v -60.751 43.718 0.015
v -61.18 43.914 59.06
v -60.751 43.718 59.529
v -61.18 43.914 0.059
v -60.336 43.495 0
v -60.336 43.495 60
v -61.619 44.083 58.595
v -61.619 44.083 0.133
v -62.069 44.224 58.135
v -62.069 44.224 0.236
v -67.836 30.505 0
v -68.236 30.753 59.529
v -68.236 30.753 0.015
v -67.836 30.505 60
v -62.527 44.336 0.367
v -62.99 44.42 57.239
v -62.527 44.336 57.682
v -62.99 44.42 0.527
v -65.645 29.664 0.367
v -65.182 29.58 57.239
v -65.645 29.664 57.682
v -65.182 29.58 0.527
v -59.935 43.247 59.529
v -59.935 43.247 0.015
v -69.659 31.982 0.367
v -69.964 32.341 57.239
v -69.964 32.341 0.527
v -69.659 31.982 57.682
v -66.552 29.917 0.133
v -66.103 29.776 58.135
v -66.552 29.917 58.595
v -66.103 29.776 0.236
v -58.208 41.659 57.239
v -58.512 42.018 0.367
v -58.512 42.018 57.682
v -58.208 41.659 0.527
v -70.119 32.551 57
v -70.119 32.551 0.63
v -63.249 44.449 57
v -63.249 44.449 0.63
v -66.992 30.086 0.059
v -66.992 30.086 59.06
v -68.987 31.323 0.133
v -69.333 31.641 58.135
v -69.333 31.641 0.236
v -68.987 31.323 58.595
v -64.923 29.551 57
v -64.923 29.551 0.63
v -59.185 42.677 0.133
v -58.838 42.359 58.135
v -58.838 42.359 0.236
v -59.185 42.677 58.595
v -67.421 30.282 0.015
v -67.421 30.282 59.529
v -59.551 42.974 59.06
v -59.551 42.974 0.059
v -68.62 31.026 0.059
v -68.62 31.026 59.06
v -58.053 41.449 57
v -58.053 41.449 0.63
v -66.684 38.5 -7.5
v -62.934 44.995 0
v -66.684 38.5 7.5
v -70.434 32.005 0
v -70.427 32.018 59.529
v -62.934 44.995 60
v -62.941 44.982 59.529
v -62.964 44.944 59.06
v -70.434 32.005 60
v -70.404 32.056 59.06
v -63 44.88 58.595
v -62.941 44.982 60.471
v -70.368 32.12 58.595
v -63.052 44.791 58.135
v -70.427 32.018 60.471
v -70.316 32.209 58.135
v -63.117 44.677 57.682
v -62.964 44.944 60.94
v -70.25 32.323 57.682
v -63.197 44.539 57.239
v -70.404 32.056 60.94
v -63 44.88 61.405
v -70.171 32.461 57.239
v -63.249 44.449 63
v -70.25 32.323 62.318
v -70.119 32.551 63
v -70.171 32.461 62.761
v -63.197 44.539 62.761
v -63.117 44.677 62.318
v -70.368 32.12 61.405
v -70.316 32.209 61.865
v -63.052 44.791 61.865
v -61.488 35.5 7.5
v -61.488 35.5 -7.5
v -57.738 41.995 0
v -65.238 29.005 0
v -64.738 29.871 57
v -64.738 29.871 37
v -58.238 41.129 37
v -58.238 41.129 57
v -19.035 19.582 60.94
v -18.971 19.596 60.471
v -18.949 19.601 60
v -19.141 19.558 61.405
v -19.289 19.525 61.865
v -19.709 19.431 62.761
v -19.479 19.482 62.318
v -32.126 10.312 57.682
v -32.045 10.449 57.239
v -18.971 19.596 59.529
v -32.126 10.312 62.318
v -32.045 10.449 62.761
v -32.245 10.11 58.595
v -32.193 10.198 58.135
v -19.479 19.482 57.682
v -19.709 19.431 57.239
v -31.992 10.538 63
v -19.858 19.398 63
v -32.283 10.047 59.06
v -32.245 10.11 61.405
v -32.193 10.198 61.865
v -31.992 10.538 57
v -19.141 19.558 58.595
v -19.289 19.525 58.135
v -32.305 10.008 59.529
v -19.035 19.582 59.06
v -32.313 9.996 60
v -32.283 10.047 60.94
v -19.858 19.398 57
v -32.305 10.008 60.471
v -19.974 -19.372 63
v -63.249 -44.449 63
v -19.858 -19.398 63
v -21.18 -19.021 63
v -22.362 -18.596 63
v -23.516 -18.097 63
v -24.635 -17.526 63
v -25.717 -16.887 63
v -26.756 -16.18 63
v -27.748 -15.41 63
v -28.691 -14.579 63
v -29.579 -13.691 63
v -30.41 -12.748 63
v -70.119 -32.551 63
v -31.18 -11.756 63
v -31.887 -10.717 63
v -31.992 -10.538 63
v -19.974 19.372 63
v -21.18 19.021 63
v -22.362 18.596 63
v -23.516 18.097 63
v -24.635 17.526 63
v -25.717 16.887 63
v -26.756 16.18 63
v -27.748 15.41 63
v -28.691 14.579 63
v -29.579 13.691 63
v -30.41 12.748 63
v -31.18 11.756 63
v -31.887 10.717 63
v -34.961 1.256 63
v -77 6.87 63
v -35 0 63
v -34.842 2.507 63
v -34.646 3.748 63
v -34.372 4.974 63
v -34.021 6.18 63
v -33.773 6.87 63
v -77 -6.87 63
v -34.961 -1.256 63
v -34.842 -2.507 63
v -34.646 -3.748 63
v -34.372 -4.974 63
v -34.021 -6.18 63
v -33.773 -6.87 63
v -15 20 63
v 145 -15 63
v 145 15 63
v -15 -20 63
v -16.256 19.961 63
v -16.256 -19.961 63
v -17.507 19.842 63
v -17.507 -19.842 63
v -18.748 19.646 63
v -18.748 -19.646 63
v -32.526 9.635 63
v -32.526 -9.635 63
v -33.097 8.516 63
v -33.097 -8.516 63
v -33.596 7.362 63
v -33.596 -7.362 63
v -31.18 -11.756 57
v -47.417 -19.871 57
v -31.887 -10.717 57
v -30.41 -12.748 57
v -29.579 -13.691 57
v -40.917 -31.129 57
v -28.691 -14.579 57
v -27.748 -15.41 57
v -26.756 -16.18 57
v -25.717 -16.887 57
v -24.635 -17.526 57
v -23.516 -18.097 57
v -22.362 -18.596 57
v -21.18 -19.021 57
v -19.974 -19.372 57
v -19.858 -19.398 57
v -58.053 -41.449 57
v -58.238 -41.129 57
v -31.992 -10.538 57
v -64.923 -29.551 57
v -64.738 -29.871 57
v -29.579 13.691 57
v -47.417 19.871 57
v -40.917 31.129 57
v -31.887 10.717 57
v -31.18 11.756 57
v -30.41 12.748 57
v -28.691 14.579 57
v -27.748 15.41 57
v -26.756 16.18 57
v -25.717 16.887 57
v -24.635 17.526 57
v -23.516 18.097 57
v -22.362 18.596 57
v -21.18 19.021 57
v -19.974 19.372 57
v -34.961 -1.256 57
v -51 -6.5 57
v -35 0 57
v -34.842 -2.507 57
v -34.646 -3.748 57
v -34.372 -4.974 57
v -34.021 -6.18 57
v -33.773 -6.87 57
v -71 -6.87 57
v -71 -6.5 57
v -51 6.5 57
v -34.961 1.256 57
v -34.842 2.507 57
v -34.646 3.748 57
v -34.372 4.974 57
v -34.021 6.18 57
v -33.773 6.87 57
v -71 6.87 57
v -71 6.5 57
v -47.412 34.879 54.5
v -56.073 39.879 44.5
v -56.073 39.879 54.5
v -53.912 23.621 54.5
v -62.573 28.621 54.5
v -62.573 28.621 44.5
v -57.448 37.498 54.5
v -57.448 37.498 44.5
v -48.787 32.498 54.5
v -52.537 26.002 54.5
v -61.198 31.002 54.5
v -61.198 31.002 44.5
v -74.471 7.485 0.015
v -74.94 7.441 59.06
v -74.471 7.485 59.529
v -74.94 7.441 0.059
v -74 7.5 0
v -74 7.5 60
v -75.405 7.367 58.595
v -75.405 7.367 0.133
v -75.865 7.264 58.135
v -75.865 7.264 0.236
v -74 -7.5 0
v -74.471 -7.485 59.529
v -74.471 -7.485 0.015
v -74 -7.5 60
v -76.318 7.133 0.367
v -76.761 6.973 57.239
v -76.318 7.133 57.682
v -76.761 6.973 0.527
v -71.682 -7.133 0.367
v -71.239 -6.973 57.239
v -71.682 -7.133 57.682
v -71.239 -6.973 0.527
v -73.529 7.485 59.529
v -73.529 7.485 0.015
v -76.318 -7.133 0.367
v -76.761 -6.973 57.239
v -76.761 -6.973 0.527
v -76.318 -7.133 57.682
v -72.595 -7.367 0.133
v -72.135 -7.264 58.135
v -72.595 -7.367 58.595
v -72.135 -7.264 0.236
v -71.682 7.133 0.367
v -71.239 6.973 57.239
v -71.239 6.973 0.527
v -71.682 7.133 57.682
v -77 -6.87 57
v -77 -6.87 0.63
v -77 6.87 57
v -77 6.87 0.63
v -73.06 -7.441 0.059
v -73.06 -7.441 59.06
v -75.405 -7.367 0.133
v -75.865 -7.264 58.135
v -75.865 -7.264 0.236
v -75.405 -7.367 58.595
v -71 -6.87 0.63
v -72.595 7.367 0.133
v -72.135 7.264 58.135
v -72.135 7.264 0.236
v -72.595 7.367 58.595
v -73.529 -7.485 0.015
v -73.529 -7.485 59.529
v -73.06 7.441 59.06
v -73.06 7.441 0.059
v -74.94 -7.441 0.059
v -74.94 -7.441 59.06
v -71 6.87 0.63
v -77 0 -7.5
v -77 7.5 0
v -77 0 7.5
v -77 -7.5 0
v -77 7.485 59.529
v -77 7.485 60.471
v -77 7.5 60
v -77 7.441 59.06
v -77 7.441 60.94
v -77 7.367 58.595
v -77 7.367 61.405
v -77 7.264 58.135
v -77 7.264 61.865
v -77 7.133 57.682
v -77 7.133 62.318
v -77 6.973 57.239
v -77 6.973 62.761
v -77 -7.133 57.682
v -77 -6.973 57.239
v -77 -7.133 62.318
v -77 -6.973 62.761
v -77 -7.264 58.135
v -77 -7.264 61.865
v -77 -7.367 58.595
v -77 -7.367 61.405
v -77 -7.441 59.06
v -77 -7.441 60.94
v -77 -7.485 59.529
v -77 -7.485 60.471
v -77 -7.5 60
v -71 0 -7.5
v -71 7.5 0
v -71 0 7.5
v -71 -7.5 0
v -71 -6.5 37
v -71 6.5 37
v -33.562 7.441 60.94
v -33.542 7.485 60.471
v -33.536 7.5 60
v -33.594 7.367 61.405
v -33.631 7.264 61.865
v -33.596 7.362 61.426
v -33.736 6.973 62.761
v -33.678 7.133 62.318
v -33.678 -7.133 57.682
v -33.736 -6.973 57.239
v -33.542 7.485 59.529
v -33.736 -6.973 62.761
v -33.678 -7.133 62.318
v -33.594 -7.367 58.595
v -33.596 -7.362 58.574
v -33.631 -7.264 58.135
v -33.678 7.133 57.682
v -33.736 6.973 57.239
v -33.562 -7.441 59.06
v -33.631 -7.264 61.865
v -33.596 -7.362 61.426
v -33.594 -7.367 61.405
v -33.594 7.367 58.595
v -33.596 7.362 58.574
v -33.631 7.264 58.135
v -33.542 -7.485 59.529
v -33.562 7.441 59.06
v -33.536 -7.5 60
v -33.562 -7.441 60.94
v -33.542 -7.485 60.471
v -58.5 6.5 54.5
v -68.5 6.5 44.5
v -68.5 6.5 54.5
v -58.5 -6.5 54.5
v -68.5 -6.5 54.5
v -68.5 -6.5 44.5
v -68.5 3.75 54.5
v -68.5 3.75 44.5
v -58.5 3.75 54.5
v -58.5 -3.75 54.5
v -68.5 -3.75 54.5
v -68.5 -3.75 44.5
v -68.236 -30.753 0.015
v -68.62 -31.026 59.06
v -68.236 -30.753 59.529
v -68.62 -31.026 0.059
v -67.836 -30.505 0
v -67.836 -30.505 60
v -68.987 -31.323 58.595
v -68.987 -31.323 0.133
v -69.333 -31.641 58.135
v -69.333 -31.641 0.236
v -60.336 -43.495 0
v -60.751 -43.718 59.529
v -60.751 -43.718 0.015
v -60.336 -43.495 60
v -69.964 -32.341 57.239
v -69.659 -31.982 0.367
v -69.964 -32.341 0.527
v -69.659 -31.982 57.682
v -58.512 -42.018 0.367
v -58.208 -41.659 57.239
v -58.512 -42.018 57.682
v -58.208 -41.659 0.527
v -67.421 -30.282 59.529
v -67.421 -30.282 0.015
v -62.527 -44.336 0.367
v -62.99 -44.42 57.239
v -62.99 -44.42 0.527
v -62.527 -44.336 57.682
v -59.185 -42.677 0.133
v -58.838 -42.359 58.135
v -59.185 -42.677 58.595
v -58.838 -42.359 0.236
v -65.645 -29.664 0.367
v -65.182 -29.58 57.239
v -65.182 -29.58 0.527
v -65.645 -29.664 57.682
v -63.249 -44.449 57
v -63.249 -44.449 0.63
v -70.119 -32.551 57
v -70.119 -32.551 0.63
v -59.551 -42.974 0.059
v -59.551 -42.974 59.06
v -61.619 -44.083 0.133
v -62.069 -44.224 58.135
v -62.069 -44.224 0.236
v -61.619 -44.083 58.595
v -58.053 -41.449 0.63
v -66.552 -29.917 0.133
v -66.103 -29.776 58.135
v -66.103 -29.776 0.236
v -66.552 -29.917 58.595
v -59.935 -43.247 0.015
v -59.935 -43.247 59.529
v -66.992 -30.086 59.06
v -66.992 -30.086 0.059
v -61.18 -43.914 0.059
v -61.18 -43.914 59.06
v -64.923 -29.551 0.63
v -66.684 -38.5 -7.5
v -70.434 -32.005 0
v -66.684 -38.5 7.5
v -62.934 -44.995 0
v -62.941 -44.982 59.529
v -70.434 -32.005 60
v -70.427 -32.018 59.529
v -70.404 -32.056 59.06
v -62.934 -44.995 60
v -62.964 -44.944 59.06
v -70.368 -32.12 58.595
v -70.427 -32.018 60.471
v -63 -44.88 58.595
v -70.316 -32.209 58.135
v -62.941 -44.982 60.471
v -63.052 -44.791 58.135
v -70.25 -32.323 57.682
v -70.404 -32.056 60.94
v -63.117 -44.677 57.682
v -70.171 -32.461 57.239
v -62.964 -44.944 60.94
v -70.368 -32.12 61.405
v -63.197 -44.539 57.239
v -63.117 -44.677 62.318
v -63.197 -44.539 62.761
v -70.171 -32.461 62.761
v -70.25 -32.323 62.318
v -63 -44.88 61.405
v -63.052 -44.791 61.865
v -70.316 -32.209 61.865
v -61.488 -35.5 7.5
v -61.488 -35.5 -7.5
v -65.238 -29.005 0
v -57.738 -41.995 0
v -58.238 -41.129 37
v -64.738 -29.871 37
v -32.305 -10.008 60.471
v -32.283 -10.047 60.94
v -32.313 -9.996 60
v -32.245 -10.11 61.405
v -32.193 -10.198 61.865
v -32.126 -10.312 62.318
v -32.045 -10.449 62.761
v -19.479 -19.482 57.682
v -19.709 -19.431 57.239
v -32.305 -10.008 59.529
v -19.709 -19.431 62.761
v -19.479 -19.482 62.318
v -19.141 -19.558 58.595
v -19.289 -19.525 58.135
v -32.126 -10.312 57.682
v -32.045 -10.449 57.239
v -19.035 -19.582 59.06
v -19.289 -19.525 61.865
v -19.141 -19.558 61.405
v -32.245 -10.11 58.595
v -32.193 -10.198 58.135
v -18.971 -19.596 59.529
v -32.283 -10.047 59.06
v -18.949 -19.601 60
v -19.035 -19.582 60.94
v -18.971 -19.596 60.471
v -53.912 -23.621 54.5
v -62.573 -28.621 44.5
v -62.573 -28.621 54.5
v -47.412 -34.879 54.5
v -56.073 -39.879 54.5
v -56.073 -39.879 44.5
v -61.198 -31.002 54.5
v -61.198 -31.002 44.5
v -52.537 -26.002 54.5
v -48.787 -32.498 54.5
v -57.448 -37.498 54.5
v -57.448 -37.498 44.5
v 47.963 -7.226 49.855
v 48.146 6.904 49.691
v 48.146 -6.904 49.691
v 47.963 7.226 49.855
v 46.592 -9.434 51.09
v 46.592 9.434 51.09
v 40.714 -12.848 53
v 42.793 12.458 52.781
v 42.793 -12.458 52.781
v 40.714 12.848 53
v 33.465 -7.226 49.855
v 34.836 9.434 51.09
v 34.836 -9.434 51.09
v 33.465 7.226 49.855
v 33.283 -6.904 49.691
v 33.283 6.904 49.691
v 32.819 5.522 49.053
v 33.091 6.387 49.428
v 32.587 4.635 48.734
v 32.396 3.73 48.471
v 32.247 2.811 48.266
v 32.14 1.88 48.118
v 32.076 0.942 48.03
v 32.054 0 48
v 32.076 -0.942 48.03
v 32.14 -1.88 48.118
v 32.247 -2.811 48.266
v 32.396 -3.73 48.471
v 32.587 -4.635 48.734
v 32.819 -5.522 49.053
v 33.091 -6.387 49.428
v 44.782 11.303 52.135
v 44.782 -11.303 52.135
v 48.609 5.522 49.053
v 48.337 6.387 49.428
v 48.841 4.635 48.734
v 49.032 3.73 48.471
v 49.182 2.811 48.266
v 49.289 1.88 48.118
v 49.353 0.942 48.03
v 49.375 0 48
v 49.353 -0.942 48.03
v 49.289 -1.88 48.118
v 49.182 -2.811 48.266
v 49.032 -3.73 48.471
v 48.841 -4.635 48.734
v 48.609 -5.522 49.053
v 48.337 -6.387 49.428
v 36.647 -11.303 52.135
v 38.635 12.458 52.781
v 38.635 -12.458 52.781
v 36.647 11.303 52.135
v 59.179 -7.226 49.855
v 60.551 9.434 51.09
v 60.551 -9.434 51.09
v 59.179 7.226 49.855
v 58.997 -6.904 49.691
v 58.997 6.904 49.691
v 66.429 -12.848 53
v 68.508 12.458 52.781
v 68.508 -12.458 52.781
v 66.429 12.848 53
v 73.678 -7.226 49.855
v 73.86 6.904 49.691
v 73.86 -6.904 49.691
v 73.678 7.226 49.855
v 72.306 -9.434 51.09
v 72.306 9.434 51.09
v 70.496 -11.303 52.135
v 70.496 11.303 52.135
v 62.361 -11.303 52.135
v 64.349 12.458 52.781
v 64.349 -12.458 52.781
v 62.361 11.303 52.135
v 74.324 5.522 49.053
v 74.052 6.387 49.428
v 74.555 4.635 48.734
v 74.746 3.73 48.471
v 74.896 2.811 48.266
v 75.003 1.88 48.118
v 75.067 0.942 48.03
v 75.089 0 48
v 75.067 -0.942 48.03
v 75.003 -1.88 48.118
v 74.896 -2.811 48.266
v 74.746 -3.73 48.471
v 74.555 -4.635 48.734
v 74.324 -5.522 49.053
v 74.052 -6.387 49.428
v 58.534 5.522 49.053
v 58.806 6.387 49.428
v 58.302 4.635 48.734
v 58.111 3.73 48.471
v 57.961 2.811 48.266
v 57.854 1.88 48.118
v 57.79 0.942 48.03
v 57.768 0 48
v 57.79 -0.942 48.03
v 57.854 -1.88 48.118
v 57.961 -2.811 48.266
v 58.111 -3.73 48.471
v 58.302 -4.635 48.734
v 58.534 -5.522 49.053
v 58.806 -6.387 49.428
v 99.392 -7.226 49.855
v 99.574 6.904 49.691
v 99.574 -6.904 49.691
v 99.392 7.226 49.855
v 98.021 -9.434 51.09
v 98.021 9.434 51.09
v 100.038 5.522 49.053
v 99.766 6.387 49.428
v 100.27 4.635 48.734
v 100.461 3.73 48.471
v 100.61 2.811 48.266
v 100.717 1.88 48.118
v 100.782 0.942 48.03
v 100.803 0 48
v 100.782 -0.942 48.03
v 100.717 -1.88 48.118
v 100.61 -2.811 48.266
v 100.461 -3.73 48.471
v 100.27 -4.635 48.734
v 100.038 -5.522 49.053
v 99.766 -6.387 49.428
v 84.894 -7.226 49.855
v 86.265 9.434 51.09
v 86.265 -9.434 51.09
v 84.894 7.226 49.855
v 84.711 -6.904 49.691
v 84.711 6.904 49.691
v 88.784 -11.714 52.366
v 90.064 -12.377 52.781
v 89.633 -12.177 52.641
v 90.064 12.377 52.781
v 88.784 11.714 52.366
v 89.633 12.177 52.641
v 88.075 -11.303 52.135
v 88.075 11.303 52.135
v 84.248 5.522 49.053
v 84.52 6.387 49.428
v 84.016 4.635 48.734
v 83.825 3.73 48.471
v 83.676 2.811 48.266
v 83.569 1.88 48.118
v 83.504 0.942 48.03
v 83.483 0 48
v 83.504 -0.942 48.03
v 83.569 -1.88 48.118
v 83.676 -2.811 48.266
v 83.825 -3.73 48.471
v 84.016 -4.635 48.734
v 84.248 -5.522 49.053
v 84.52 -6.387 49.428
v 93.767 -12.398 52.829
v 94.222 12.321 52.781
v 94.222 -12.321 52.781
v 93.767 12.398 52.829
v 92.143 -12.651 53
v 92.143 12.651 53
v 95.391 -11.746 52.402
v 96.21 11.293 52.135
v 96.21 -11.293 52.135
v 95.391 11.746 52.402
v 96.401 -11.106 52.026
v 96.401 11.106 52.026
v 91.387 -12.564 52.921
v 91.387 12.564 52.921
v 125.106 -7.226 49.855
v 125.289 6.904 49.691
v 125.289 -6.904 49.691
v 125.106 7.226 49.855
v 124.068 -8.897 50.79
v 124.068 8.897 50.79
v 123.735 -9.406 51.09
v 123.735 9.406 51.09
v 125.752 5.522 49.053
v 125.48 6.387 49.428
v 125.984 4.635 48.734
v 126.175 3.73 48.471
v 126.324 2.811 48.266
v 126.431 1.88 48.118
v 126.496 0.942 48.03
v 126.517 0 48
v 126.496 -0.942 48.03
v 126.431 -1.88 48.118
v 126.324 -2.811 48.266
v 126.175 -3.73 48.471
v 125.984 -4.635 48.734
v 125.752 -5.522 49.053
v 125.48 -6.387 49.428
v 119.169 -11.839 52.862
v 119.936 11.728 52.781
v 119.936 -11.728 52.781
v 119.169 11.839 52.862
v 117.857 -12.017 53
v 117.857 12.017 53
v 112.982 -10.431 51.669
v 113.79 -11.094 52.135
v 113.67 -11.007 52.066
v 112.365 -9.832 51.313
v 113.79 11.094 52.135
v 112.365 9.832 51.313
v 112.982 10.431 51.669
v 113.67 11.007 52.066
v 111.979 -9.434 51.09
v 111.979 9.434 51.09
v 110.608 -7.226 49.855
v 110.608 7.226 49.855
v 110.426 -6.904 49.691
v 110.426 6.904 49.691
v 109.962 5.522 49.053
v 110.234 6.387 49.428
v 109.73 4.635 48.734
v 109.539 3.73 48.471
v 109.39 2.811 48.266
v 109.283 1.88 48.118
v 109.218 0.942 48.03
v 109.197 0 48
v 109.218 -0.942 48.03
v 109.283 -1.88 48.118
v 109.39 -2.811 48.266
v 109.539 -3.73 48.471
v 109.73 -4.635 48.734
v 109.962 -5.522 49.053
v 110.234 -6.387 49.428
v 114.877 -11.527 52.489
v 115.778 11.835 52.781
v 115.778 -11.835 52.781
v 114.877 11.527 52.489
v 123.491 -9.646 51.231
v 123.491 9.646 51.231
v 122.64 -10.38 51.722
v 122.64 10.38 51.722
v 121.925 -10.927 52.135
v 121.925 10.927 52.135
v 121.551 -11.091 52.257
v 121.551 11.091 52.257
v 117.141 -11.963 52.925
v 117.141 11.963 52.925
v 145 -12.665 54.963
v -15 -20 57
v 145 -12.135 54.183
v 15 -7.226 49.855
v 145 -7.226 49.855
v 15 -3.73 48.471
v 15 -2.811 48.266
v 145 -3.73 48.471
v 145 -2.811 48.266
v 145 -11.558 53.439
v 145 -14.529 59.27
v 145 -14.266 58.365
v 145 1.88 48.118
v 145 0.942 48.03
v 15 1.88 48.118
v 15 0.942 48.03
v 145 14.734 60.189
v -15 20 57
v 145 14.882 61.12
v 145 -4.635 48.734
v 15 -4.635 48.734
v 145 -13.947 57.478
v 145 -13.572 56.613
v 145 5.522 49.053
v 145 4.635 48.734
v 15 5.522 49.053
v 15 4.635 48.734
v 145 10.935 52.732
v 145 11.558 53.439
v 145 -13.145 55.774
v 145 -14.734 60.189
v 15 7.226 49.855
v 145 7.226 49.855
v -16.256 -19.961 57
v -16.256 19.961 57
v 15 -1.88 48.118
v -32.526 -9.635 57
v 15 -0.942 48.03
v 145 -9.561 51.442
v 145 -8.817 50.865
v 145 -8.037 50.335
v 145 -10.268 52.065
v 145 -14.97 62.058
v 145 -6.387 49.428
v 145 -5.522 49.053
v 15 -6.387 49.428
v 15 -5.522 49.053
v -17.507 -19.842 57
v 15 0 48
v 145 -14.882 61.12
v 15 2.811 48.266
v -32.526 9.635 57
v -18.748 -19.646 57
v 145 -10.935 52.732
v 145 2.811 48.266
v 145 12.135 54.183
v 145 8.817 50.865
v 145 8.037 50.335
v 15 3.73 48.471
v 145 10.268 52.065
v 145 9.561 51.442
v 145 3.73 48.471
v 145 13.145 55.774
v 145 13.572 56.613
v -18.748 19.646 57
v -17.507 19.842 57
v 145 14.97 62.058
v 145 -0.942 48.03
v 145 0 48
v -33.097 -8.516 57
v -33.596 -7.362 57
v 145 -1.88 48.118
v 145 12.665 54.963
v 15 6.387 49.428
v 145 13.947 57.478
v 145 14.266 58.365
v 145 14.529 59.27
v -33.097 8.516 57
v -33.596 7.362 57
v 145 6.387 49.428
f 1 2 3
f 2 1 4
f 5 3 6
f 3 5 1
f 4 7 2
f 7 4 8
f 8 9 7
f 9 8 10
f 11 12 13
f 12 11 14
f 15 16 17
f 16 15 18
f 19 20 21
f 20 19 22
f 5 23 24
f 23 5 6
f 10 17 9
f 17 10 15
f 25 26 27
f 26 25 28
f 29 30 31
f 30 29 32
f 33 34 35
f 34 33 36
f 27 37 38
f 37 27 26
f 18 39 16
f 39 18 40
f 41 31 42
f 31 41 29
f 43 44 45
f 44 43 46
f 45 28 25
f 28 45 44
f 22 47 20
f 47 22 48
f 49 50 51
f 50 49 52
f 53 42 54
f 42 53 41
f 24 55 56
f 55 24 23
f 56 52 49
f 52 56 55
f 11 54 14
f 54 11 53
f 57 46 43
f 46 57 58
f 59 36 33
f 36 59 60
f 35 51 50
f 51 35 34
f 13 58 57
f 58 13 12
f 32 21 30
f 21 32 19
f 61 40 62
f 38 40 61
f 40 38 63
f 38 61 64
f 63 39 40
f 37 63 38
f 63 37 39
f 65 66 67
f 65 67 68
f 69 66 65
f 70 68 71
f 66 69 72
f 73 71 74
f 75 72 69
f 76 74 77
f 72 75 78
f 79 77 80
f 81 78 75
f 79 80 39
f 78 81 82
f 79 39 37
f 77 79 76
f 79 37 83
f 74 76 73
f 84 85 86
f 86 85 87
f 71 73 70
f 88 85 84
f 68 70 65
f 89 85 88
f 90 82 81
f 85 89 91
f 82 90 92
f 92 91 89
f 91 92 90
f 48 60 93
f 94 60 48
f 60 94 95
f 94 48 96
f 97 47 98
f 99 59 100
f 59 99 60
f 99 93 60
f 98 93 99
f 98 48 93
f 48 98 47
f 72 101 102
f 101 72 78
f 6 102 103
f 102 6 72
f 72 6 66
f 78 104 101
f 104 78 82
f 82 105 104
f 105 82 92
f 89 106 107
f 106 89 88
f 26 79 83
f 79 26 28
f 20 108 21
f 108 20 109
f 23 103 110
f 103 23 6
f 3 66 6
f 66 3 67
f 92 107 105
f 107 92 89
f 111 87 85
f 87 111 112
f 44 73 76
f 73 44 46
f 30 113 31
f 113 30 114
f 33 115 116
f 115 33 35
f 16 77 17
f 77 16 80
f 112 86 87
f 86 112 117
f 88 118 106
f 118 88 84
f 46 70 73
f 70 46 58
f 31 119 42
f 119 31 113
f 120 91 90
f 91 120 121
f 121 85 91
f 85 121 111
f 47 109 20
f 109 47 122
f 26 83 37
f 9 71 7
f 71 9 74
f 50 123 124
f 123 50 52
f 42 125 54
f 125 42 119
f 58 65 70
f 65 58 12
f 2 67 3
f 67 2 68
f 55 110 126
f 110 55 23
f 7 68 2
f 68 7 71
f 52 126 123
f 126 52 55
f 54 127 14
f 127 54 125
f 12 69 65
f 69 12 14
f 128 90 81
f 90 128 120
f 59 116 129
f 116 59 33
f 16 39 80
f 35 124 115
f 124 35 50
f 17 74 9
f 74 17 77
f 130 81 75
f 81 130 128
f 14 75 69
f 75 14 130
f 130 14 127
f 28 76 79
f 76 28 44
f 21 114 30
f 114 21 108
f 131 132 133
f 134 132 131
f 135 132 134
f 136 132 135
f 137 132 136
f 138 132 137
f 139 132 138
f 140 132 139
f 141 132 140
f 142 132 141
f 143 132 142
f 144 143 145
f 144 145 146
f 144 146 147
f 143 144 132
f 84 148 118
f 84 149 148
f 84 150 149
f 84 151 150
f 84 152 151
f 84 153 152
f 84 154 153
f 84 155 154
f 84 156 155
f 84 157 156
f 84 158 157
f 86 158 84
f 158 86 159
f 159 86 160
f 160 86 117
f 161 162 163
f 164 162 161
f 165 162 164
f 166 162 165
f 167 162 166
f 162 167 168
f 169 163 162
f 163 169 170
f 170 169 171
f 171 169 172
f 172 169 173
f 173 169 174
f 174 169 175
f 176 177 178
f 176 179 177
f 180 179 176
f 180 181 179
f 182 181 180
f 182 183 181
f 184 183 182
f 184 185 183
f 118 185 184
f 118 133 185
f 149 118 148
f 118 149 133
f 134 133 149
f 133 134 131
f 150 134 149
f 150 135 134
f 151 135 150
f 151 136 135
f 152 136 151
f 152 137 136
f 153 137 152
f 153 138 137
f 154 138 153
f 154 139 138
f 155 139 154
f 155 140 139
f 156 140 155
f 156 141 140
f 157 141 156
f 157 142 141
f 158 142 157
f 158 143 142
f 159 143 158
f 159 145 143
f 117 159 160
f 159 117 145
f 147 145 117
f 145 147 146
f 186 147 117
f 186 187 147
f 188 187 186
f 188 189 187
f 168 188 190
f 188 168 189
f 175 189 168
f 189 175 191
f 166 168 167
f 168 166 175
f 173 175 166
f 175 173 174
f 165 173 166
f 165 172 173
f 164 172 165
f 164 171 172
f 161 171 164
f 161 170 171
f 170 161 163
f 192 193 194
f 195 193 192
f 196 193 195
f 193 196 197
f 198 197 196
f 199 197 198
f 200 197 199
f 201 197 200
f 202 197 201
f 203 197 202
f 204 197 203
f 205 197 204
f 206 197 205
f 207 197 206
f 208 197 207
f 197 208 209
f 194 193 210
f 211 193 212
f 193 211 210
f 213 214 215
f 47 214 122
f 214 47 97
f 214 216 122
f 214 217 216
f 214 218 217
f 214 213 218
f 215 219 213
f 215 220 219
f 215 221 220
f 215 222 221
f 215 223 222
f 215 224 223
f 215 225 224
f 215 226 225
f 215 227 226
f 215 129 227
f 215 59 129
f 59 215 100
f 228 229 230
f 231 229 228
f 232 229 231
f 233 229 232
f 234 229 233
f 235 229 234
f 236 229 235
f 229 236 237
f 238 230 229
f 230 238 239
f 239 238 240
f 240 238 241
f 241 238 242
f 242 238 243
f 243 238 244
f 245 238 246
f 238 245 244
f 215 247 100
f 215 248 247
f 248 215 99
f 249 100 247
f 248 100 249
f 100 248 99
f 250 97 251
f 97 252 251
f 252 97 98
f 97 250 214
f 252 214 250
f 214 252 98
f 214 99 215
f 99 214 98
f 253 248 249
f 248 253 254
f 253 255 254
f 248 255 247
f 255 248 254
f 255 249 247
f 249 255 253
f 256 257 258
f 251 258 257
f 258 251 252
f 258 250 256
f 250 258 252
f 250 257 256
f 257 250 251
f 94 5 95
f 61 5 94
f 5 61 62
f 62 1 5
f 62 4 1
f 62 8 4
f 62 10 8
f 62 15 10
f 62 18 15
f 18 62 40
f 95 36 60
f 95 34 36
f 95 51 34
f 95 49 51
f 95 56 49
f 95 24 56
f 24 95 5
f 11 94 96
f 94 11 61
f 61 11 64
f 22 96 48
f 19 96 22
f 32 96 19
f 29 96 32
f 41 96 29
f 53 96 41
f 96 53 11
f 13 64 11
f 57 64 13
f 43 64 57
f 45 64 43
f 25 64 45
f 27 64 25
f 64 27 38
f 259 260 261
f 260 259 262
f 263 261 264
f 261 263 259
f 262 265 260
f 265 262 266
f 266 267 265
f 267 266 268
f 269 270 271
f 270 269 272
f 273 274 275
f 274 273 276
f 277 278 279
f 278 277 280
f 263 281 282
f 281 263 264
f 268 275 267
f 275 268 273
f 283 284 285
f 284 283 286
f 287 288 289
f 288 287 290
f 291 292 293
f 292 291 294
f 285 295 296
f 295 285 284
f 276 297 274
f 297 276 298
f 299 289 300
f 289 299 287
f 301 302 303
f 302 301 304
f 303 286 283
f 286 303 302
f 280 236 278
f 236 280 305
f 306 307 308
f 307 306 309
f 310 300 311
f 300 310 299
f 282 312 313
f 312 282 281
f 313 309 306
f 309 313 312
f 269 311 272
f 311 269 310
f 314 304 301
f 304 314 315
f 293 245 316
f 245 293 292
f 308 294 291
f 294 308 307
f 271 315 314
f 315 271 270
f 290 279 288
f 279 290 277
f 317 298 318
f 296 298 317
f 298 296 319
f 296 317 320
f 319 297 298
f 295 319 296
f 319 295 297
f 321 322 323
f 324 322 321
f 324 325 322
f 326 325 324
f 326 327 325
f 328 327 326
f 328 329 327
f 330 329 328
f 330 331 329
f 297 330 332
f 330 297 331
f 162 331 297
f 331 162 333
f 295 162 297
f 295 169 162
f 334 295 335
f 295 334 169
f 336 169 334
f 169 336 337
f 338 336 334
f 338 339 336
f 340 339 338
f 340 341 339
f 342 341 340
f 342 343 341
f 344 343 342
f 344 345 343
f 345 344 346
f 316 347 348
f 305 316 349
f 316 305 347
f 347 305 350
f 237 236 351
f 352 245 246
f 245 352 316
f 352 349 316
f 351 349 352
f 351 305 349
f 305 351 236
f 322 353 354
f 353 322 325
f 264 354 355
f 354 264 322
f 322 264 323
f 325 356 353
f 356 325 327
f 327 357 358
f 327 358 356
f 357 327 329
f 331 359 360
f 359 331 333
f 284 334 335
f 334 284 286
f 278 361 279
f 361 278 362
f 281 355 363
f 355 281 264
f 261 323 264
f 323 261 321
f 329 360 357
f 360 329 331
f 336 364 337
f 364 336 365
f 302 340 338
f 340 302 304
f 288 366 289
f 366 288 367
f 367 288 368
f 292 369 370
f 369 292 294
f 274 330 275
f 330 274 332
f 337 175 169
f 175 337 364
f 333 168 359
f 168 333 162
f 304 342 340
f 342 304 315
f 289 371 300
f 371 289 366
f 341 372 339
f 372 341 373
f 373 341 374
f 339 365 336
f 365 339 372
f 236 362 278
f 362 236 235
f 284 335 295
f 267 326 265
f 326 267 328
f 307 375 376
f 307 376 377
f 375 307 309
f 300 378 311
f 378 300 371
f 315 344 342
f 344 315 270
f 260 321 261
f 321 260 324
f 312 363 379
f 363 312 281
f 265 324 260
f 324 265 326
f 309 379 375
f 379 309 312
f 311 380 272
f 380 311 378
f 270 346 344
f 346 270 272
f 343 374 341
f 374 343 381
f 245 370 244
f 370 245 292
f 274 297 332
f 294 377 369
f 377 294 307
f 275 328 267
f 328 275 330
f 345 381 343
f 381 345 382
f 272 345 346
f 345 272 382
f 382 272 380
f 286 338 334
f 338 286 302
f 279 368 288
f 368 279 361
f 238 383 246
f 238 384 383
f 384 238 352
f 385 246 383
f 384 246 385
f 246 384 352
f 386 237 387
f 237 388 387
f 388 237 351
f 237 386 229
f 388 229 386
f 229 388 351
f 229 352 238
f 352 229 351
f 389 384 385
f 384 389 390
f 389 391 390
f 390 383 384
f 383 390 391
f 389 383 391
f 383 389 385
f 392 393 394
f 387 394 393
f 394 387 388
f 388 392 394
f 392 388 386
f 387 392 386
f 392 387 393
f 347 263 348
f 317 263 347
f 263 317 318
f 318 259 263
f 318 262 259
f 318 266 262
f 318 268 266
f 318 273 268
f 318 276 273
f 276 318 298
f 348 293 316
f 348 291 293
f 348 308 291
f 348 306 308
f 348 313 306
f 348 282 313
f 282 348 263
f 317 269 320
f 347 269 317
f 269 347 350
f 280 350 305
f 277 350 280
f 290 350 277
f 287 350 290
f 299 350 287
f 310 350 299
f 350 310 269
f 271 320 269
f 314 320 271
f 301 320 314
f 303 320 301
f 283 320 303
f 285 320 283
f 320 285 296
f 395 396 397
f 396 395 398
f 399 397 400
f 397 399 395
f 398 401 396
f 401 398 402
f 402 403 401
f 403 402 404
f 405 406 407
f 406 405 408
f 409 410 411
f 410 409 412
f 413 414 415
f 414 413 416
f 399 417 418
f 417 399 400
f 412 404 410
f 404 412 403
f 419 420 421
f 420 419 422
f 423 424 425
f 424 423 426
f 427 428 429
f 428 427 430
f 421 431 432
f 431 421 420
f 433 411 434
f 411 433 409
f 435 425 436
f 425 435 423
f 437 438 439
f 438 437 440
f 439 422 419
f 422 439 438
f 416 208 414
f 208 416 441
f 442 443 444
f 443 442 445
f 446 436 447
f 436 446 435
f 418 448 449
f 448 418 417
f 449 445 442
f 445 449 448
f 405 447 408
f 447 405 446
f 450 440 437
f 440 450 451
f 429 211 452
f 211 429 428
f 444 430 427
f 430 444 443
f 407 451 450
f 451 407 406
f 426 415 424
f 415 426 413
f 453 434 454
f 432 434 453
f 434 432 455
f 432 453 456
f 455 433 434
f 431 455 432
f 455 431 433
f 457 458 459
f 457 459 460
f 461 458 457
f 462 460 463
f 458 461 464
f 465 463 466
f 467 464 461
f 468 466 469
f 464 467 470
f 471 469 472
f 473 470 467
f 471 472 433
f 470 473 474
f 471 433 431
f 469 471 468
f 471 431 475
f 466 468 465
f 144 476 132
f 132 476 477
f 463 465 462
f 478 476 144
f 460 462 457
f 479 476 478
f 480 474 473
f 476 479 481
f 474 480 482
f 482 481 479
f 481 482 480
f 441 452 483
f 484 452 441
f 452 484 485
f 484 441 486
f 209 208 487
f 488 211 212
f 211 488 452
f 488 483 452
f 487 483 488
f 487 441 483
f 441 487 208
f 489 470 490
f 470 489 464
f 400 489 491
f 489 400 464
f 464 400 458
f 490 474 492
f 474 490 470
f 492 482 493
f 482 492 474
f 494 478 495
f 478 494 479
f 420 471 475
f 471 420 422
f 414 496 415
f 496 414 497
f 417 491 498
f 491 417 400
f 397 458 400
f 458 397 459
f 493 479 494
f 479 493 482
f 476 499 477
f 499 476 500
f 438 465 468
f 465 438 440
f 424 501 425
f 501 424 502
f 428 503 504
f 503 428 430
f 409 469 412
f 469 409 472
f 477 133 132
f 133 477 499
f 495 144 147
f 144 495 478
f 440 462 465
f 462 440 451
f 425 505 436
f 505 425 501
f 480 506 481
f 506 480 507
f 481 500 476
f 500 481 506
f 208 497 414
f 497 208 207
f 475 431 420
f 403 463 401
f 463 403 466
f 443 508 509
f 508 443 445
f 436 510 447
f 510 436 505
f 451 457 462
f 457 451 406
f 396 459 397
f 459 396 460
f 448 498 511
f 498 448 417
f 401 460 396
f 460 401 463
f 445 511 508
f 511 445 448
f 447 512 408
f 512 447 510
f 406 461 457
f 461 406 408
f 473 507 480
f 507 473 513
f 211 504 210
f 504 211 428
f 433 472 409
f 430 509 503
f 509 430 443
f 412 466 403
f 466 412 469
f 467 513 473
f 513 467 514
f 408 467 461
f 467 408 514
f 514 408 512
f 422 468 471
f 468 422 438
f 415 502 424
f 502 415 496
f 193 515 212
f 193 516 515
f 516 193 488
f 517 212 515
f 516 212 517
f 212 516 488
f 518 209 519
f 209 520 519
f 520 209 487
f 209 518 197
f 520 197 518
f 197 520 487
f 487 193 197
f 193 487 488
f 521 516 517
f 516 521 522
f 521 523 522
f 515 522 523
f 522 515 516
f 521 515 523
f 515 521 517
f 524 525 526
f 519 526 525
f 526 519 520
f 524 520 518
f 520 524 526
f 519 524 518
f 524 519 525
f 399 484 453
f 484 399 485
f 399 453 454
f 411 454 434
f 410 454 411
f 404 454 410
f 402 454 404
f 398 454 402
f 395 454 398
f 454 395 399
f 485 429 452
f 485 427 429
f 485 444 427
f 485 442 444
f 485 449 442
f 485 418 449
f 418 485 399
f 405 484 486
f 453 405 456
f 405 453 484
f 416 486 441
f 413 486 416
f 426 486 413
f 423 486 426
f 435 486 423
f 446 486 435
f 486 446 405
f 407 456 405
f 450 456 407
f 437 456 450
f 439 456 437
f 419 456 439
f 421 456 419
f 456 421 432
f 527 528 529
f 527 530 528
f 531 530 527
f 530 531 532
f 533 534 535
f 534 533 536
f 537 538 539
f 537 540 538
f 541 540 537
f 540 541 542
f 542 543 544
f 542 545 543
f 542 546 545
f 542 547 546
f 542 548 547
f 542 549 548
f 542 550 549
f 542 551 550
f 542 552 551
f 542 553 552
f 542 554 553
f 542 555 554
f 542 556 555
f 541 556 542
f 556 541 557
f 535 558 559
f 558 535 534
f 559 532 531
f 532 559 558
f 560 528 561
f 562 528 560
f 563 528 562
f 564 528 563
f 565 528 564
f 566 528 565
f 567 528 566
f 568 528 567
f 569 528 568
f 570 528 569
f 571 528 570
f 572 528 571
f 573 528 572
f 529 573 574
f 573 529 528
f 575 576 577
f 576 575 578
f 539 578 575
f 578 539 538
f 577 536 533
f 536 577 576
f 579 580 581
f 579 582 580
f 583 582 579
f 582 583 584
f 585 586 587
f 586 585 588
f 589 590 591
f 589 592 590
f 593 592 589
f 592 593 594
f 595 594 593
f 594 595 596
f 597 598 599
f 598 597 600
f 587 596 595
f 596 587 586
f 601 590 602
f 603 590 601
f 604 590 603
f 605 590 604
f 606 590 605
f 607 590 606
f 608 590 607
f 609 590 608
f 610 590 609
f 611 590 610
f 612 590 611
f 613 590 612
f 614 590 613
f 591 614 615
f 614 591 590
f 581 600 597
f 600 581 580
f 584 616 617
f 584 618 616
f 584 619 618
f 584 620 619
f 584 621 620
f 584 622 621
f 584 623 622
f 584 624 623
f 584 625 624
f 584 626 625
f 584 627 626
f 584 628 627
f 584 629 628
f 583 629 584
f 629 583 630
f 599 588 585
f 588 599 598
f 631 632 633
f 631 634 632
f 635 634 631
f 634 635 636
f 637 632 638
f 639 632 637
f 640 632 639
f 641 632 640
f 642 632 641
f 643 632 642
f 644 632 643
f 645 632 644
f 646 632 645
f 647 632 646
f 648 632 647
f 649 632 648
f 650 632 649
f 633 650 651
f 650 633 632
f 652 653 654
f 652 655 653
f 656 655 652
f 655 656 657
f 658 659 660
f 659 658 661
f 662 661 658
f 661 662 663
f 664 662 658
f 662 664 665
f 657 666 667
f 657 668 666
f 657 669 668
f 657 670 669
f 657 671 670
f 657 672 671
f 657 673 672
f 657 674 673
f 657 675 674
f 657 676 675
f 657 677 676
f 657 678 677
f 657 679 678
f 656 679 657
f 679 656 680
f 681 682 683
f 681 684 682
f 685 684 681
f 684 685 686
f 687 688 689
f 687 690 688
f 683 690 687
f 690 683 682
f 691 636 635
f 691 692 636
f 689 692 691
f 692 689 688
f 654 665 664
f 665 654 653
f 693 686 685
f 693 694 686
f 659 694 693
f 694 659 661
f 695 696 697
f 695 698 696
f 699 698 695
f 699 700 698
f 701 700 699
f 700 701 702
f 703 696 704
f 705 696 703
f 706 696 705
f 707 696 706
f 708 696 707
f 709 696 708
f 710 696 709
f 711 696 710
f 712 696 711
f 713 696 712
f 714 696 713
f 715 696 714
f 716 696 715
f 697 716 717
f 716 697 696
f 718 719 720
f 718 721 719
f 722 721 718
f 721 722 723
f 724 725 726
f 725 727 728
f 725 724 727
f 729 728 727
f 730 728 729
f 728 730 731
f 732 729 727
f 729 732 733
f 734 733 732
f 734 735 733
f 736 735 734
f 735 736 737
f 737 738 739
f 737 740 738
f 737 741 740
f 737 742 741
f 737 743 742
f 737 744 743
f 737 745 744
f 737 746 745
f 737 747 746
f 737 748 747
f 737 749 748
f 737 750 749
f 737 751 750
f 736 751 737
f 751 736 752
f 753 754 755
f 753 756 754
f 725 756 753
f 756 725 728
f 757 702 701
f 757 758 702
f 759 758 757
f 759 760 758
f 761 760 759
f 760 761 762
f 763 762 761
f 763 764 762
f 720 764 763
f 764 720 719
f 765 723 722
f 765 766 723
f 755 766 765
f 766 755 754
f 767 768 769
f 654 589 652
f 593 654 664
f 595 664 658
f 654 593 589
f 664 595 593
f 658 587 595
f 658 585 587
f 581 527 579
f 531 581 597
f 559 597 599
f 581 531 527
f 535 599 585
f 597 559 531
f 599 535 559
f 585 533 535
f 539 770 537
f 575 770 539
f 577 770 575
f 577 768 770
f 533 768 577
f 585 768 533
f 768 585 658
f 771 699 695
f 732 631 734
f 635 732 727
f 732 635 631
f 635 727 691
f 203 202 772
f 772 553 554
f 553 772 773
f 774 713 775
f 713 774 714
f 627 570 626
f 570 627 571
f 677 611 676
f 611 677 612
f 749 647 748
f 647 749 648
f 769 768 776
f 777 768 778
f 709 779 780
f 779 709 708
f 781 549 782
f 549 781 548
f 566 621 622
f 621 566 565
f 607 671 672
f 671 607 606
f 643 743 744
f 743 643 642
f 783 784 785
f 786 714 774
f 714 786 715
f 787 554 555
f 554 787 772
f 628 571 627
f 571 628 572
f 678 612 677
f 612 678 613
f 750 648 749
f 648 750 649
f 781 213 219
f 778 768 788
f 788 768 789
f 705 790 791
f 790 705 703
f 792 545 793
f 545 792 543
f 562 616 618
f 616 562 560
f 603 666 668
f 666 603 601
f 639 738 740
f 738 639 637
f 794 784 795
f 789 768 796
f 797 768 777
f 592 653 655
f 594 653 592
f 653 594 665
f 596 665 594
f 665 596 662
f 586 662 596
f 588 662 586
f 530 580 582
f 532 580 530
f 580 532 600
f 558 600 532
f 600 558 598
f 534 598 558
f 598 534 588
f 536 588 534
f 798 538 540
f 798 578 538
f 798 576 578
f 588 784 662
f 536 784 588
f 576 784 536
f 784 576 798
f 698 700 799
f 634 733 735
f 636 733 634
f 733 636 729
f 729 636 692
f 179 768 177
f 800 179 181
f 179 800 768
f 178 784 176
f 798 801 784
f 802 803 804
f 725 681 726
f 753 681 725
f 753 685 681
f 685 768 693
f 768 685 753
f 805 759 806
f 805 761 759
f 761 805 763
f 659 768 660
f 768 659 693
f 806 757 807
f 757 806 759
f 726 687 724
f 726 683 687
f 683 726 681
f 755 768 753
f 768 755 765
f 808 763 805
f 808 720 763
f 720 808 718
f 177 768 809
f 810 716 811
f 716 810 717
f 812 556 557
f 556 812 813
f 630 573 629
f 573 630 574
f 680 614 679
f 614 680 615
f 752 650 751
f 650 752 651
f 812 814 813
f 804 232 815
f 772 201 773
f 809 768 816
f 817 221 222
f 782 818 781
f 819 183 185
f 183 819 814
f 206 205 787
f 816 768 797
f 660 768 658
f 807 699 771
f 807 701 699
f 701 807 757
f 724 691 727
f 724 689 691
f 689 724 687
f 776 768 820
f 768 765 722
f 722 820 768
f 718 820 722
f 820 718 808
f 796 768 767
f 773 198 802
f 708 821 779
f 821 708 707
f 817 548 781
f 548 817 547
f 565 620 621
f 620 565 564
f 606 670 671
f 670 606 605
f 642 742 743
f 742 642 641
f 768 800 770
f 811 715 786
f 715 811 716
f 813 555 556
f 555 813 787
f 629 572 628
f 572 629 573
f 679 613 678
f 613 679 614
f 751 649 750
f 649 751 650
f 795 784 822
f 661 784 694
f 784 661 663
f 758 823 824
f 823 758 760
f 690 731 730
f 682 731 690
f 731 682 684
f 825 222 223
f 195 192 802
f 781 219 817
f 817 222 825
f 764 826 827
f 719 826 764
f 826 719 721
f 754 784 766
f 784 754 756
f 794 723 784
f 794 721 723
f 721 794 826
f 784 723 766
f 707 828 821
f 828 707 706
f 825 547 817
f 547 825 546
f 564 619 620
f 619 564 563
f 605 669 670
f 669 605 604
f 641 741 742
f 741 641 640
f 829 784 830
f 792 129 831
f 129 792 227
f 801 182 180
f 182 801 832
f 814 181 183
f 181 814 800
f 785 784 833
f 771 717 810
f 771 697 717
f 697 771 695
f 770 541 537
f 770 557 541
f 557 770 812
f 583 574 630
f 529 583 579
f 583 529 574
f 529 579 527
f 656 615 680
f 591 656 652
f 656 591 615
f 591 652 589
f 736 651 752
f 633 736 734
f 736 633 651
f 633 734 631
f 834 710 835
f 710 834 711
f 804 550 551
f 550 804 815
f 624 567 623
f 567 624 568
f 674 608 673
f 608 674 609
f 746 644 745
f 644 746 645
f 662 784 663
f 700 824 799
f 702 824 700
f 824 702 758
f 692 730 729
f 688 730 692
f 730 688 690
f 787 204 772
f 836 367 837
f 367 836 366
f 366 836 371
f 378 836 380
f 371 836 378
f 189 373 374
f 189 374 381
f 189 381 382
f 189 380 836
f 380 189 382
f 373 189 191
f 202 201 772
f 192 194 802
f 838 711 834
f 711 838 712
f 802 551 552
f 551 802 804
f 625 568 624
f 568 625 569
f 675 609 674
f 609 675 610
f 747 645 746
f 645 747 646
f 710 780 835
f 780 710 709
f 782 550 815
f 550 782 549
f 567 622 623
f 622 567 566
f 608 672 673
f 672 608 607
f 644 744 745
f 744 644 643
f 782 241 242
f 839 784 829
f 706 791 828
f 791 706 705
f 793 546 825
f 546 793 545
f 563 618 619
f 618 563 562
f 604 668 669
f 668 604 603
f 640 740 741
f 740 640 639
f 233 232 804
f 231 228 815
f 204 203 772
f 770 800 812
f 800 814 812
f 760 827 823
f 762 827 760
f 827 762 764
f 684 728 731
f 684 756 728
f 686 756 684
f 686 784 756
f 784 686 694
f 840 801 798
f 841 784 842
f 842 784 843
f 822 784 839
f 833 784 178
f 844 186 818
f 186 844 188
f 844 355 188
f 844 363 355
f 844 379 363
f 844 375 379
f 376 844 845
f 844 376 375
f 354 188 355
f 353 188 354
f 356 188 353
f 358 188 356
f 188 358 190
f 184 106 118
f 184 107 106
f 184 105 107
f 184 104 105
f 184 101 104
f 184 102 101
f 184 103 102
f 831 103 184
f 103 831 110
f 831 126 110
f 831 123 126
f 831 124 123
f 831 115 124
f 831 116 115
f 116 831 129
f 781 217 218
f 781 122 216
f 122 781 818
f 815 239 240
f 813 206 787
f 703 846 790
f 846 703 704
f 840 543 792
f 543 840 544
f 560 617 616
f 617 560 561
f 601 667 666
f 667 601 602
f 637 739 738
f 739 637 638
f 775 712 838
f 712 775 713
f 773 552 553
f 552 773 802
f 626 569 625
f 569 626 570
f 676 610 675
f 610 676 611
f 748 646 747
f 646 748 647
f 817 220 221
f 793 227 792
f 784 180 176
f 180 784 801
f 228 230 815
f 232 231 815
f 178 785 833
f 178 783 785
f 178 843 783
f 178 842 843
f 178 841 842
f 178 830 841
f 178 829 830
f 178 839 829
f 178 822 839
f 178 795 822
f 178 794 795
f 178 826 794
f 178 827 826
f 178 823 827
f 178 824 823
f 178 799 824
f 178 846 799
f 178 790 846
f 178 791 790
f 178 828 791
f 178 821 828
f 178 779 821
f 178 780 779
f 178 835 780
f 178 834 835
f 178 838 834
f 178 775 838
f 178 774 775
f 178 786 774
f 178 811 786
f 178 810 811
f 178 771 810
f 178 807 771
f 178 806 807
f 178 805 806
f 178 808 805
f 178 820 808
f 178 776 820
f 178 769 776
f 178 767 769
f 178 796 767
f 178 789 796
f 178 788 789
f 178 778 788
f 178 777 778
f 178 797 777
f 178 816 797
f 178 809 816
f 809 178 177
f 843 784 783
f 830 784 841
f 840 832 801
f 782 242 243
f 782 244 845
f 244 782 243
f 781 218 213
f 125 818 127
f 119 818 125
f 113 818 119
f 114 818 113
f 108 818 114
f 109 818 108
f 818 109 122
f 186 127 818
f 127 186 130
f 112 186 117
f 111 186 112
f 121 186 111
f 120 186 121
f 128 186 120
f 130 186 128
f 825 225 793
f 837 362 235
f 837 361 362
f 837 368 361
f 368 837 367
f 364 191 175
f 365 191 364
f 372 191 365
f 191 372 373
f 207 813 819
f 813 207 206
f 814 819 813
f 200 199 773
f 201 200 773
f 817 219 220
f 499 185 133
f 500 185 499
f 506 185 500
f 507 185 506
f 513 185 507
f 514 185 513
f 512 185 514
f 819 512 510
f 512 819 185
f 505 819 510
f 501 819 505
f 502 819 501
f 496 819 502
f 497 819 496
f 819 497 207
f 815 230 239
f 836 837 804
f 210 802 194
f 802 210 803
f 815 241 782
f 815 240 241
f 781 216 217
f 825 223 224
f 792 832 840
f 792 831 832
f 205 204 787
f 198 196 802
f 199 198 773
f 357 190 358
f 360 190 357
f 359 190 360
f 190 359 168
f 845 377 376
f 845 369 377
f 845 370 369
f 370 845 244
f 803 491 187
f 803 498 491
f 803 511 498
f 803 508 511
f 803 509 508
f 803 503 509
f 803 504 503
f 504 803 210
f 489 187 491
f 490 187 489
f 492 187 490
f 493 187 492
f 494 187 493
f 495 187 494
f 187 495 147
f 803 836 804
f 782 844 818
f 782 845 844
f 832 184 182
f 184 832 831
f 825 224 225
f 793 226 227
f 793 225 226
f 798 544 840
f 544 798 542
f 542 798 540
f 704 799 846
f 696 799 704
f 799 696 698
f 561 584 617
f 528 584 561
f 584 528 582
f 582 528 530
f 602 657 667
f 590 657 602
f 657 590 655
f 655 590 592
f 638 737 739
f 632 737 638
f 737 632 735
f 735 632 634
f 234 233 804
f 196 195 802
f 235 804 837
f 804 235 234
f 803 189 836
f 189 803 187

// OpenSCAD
//Created By Matthew Andres
//OSAT Project


prong_height = 60; //how tall prong is
prong_width = 15; //how wide the prong is 
prong_depth = 6; //how thick the prong is
prong_length = 75; //length from handle 
support_distance = 20; //how big the triangle on the corner is

hub_radius = 20; //radius of hub that connects all prongs
total_length =50; //total length of hub
end_width = 30; //end width of hub
hub_height = 6; // how tall hub is

//not working for other values need to change code below to organize how you want if change value
num_prongs = 3; //total number of prongs

//handle variables -- these do not all work properly when changing values
grip_radius = 15; //radius of handle
finger_depth = 10; //how deep fingers go
grip_length = 130; //length of handle
finger_radius= 10; //how wide fingers are
num_fingers = 4; //how many finger grips


//need to change if change number of prongs
for (i = [1:num_prongs]){
    rotate(i*(180/num_prongs)/2+(180/num_prongs)/2)
    prong();   
};
translate([-15,0,prong_height-(hub_height)/2])
rotate([0,0,0])
//hub();
//rotate([0,180,90])

handle();

module hub(){
difference(){
linear_extrude(height=hub_height){
circle(r=hub_radius,$fn=100);
}
translate([0,hub_radius/2,hub_height/2])
cube([2*hub_radius,hub_radius,2*hub_height],center=true);
}


linear_extrude(height=hub_height)
polygon([[-hub_radius,0],[hub_radius,0],[end_width/2,total_length-hub_radius],[-end_width/2,total_length-hub_radius]],[[0,1,2,3]]);

}
module prong(){
translate([0,prong_length-1,0])
union(){
difference(){
    cylinder(h=prong_height, d = prong_width,$fn =100);
    translate([-prong_width/2,prong_depth/2,-1])
    cube([prong_width,prong_width,prong_height+2]);
    translate([-prong_width/2,-prong_width-prong_depth/2,-1])
    cube([prong_width,prong_width,prong_height+2]);
}

rotate([0,45,0])
cube([prong_width/sqrt(2),prong_depth,prong_width/sqrt(2)], center=true);


translate([0,prong_depth/2,prong_height])
rotate([90,0,0])
difference(){
    cylinder(h=prong_length, d = prong_width,$fn =100);
    translate([-prong_width/2,prong_depth/2,-1])
    cube([prong_width,prong_width,prong_length+2]);
    translate([-prong_width/2,-prong_width-prong_depth/2,-1])
    cube([prong_width,prong_width,prong_length+2]);
}

mod = support_distance/8;
translate([+prong_width/2-1,-prong_depth/2,prong_height-prong_depth/2])
rotate([0,90,180])
difference(){
linear_extrude(height=prong_width-2)
polygon([[0,0],[0,support_distance],[support_distance,0]],[[0,1,2]]);

translate([mod,mod,-1])    
linear_extrude(height=prong_width/4)
polygon([[0,0],[0,support_distance/2],[support_distance/2,0]],[[0,1,2]]);
    
translate([mod,mod,prong_width*3/4-1])    
linear_extrude(height=prong_width/4)
polygon([[0,0],[0,support_distance/2],[support_distance/2,0]],[[0,1,2]]);
}}
}

module handle(){
difference(){
rotate([0,180,0])
hull(){
rotate([0,180,0])
union(){
translate([total_length-hub_radius,0,hub_height])
rotate([90,180,90])
difference(){
cylinder(h=grip_length, r=grip_radius, $fn=100);
translate([-grip_radius*3/2,-grip_radius*2,-grip_length/2])
cube([3*grip_radius,2*grip_radius,2*grip_length],center=false);
}

rotate([0,0,-90])
hub();
}
}

for (i = [1:num_fingers]){
    
    translate([i*(grip_length-num_fingers*finger_radius)/(num_fingers-.5)+total_length-hub_radius,finger_radius*2,-grip_radius+1])
    rotate([90,90,0])
    cylinder(r=finger_radius, h = 4*grip_radius);   
};
}

}

